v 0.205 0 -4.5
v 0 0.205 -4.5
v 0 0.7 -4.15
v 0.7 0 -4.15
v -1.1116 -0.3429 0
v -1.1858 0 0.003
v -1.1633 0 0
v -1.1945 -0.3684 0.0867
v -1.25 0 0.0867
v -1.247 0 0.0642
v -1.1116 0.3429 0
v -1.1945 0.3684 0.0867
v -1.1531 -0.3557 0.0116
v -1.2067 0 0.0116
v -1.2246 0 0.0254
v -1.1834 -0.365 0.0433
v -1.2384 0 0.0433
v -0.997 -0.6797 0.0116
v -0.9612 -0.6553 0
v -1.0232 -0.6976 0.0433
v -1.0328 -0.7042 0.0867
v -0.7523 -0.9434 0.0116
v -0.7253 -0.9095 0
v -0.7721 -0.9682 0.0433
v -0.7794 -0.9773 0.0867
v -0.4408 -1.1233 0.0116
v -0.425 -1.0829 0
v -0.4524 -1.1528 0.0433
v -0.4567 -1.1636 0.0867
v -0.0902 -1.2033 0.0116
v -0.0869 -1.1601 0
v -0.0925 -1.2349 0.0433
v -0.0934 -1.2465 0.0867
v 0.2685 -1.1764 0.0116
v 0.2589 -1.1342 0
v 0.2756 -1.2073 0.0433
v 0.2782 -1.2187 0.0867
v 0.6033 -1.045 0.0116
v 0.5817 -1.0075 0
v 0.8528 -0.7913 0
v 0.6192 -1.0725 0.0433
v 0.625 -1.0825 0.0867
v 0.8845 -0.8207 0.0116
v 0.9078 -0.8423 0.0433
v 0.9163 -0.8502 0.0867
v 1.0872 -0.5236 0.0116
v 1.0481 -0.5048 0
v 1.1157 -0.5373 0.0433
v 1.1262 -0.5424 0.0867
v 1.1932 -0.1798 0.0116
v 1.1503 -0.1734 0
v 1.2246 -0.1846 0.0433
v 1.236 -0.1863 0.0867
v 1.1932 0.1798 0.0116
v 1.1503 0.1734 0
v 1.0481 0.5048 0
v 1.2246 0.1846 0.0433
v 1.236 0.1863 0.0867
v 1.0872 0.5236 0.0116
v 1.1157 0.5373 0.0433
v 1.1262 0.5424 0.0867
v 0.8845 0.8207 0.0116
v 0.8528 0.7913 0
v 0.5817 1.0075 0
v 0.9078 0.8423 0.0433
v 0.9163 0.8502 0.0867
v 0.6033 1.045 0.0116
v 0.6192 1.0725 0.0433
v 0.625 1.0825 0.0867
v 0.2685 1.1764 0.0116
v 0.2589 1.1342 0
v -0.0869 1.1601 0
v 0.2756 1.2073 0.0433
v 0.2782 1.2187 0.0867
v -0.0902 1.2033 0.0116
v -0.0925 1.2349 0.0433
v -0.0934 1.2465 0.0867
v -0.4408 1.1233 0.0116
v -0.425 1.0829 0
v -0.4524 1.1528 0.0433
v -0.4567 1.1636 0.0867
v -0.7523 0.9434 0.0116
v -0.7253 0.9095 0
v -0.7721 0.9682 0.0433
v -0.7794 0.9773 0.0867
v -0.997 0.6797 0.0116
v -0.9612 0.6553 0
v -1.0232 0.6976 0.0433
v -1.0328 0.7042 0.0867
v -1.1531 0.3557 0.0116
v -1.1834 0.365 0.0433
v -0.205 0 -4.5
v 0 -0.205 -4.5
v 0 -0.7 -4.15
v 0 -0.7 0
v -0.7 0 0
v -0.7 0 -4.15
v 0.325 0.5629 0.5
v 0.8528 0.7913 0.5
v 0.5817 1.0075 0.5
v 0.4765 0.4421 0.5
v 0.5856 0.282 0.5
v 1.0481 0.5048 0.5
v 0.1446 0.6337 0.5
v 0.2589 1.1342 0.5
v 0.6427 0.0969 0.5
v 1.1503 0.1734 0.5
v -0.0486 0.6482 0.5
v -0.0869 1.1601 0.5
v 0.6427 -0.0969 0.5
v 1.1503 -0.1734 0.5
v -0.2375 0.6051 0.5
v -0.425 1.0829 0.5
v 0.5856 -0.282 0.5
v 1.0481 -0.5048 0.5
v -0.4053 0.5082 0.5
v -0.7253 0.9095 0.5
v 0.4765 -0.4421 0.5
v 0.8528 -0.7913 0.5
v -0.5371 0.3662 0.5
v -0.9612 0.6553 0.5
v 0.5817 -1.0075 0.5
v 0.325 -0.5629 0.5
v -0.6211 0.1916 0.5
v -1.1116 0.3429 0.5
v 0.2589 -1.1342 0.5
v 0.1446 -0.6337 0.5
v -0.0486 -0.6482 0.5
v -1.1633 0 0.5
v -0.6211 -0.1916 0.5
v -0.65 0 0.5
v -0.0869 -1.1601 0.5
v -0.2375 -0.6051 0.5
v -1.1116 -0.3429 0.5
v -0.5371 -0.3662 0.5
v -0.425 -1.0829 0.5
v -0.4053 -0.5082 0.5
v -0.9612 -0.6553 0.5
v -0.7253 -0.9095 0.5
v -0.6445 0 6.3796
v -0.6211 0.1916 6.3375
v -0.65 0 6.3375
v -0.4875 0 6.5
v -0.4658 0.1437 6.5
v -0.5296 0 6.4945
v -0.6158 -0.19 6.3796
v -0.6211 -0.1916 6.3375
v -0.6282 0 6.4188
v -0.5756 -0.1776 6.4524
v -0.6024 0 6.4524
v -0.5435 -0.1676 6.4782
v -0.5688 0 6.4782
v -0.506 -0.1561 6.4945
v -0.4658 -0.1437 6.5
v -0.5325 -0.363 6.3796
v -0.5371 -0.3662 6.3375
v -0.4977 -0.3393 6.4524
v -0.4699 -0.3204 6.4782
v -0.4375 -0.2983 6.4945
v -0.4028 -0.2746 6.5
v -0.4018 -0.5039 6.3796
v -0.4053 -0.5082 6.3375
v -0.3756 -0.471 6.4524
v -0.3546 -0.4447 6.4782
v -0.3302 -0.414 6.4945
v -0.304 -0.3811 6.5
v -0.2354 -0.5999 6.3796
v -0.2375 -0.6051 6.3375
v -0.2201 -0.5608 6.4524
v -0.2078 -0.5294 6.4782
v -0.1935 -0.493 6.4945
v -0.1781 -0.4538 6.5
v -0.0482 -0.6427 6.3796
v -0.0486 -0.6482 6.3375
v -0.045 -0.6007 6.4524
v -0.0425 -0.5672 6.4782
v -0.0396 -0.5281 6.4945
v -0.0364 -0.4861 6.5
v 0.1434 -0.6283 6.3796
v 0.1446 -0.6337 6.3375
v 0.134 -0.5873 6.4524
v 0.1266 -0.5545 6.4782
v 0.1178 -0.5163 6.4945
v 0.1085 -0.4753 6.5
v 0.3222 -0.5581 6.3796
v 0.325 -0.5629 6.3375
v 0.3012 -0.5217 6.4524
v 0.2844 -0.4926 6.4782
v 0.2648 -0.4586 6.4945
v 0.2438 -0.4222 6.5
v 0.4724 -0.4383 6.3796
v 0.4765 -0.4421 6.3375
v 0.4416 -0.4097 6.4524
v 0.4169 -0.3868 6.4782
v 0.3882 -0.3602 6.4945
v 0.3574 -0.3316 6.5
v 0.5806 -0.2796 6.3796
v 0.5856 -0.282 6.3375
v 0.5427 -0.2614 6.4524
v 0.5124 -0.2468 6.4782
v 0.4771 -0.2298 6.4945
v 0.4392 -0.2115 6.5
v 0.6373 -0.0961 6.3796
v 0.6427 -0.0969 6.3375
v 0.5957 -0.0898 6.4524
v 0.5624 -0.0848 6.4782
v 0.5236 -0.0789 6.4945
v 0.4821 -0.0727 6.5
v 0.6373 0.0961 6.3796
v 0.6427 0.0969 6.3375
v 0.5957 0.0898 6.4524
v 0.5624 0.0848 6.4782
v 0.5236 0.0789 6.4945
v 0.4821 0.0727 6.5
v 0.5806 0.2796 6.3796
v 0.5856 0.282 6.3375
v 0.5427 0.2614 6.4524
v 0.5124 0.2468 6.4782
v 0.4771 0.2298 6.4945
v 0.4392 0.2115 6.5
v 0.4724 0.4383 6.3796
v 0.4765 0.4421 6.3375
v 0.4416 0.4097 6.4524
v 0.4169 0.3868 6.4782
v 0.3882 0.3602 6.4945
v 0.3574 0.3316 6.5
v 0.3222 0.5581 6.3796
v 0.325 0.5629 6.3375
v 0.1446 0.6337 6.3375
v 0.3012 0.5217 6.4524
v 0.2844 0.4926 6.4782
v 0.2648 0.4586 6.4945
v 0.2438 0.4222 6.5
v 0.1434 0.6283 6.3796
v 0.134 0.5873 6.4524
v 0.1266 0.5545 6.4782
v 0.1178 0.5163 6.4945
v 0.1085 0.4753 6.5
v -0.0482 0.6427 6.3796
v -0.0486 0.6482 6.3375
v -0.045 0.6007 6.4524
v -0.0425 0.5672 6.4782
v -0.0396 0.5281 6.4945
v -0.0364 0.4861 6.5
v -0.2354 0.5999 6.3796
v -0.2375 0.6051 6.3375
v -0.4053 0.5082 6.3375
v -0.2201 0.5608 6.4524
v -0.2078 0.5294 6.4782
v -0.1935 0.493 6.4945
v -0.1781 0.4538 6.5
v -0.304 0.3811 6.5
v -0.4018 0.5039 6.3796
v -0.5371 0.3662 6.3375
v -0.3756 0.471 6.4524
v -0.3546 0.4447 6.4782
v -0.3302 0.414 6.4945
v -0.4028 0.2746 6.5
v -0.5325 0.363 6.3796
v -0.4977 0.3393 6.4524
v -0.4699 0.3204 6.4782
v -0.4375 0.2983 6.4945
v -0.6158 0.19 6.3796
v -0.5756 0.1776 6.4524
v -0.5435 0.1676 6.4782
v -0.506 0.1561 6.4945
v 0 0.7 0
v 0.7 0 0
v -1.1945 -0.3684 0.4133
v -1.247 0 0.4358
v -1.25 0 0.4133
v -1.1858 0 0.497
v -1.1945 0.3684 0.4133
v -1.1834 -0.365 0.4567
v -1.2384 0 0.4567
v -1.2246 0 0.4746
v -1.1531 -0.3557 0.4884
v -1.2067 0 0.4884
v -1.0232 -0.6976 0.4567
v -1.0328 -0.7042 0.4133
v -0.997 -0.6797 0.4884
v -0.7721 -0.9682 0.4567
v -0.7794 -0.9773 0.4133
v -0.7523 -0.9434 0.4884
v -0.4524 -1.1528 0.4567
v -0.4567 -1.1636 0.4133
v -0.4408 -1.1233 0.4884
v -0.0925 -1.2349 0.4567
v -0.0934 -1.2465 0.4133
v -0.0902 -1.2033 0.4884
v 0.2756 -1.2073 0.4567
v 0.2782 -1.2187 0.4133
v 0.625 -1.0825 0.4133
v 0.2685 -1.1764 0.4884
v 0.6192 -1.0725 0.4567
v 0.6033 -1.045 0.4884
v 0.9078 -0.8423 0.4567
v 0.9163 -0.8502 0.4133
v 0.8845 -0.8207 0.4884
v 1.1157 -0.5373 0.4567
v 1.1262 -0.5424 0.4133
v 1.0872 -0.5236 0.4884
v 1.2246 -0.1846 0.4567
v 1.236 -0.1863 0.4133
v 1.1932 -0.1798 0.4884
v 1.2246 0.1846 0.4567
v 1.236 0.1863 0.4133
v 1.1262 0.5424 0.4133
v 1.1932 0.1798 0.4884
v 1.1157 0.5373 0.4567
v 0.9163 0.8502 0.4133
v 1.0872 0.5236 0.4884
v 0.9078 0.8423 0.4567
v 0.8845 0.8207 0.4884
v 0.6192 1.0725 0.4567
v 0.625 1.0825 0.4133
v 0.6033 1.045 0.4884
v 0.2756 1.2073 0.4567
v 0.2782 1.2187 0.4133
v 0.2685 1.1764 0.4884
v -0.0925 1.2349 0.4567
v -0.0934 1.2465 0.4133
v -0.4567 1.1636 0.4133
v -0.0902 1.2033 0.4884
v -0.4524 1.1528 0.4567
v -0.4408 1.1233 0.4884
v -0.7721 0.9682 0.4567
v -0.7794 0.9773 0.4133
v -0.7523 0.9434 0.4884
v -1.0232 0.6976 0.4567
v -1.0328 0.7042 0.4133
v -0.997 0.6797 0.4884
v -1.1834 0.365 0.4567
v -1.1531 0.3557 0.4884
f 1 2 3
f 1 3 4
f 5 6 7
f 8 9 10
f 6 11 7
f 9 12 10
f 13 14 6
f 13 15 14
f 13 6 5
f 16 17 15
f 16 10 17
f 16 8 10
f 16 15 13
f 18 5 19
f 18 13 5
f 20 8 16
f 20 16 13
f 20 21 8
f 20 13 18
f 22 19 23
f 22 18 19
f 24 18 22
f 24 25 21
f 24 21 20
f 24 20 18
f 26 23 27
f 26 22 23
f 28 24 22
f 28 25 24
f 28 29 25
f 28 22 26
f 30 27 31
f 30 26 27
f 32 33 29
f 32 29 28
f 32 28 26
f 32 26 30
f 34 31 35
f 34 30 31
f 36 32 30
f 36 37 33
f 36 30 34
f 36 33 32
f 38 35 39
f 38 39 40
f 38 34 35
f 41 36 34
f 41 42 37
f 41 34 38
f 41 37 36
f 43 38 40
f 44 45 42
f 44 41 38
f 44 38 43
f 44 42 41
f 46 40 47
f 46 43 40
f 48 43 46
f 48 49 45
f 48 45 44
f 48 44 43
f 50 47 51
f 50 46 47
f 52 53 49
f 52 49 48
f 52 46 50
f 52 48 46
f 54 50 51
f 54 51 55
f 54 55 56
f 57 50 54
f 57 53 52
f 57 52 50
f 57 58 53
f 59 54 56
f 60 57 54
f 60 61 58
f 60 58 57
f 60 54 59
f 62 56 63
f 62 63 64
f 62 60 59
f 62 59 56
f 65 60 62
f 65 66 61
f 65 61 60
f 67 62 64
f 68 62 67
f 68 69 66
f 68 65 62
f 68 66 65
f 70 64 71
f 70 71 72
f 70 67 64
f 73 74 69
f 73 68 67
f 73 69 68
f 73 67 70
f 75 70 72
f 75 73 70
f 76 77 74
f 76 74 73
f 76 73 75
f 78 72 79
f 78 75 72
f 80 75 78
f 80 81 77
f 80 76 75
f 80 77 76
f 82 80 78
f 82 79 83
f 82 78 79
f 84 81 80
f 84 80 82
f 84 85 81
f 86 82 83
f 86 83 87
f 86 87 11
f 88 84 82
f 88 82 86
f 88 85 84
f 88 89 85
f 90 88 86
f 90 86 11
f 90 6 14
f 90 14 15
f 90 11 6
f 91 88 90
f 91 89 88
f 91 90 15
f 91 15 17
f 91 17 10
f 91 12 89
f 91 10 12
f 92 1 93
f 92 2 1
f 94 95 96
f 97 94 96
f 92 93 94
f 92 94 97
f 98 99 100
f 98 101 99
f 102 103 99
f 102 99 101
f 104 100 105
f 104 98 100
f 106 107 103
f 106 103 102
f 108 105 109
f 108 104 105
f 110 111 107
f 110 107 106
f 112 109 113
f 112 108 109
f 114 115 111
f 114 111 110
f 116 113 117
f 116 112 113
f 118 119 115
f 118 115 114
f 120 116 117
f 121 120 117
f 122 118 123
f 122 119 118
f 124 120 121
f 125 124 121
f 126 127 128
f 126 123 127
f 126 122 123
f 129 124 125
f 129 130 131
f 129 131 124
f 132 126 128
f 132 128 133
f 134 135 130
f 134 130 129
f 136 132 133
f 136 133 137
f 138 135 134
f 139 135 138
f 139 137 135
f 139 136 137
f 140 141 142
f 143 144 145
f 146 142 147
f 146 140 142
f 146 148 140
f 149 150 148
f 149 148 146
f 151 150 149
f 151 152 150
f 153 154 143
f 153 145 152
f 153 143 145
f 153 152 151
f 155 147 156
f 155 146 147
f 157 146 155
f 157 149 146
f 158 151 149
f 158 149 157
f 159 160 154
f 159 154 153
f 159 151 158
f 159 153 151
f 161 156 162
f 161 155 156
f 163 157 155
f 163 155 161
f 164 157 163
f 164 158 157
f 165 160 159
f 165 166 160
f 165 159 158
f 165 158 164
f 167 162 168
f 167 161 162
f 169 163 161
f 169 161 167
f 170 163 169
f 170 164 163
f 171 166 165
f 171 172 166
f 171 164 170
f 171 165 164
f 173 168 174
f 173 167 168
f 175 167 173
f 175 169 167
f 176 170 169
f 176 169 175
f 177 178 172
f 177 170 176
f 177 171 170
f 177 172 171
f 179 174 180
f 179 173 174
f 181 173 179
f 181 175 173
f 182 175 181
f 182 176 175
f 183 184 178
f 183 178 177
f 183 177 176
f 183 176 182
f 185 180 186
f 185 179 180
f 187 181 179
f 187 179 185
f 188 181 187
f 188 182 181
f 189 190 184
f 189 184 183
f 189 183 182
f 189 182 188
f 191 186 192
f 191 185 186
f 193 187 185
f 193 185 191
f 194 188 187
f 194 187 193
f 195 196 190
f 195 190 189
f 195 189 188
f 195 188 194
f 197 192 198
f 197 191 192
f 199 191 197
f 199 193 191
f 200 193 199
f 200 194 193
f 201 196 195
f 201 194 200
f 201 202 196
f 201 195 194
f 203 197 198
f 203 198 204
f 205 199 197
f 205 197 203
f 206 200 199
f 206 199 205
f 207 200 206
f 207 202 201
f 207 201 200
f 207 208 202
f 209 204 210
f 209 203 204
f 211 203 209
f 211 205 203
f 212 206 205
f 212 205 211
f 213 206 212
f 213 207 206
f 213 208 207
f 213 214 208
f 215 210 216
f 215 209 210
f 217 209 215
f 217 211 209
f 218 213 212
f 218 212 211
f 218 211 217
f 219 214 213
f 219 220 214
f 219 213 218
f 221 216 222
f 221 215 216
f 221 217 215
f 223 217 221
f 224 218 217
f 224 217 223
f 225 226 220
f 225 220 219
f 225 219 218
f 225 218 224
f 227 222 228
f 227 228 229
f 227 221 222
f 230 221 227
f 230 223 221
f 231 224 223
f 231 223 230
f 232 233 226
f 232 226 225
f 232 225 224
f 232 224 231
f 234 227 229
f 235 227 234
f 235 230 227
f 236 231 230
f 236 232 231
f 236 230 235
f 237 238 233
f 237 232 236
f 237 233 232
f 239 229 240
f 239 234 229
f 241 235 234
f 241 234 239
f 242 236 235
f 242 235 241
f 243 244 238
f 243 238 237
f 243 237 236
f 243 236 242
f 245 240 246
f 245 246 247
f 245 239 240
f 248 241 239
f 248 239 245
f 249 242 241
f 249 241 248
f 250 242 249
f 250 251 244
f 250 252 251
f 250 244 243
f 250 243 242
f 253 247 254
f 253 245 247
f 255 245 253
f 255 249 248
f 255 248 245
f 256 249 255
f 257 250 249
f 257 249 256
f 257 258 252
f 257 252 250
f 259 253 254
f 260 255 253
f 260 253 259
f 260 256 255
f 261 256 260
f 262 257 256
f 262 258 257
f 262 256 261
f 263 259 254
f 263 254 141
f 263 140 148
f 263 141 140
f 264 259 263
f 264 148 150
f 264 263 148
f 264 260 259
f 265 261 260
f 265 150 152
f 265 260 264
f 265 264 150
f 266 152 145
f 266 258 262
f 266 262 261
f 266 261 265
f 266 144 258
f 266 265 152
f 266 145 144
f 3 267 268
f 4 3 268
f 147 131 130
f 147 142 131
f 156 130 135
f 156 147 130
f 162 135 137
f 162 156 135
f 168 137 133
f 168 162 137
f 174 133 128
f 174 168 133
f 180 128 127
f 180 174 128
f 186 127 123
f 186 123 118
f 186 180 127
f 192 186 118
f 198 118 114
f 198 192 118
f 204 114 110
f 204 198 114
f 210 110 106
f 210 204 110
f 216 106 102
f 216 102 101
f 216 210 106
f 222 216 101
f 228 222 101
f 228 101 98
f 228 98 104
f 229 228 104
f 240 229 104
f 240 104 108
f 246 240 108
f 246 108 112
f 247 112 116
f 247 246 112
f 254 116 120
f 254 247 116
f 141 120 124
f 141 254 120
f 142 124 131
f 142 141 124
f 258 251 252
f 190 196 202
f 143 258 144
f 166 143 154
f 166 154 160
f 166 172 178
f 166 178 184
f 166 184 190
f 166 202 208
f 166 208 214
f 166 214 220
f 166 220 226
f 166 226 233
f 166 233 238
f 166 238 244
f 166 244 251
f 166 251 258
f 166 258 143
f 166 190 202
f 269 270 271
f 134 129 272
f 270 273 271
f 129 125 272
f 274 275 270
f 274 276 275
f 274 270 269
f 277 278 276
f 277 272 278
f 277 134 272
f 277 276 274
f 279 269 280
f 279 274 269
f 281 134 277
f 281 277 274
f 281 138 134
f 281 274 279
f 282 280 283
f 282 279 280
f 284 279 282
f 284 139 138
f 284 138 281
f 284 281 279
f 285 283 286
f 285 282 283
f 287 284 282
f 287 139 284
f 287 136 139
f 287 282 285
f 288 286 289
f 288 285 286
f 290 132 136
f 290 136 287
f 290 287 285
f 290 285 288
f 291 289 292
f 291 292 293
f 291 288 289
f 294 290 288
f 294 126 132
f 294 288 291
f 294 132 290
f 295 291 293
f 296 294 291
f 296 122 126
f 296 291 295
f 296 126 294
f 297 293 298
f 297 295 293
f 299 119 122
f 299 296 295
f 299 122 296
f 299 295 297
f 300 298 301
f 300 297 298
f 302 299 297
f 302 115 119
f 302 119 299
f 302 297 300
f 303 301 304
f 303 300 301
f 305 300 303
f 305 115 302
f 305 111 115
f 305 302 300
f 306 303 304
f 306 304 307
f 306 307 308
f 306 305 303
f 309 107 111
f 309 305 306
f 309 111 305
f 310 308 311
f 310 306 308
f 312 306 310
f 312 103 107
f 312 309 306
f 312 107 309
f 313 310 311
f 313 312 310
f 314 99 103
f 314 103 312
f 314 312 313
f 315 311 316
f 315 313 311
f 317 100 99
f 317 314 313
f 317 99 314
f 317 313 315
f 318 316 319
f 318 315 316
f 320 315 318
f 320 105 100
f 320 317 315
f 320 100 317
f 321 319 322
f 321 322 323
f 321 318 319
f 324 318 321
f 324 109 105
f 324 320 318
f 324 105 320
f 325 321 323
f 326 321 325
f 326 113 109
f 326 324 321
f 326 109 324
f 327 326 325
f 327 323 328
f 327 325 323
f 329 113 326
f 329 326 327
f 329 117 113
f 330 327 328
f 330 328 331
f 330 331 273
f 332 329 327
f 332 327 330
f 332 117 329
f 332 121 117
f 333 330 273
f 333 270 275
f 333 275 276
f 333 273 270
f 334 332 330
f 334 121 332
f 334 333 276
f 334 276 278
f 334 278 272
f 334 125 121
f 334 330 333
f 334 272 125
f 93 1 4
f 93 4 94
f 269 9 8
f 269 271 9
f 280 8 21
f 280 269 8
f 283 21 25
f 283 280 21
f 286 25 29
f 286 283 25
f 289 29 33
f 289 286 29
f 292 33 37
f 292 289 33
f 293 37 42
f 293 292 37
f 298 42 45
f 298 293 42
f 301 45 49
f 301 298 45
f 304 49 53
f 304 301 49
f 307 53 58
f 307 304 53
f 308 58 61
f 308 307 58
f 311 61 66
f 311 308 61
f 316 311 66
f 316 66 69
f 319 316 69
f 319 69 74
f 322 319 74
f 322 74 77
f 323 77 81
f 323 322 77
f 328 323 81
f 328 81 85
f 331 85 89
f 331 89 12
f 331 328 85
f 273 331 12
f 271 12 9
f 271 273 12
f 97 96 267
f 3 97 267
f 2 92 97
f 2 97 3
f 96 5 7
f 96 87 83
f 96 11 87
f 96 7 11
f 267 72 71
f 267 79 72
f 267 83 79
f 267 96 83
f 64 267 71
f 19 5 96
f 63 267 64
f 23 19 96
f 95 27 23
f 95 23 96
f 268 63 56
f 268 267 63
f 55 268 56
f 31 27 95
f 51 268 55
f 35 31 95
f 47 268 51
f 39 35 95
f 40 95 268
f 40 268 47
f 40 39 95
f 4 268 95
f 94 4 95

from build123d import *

# Parameters (mm, degrees)
PAD_DEPTH    = 4.5
CHAMFER_SIZE = 0.35


with BuildPart() as part:
    # Sketch → Revolution (revolve)
    with BuildSketch(Plane(origin=(0, 0, 0), x_dir=(-1, 0, 0), z_dir=(0, 1, 0))):
        with BuildLine():
            Line((0, 0), (1.163333, 0))
            ThreePointArc((1.163333, 0), (1.224616, 0.025384), (1.25, 0.086667))
            Line((1.25, 0.086667), (1.25, 0.413333))
            ThreePointArc((1.25, 0.413333), (1.224616, 0.474616), (1.163333, 0.5))
            Line((1.163333, 0.5), (0.65, 0.5))
            Line((0.65, 0.5), (0.65, 6.3375))
            ThreePointArc((0.65, 6.3375), (0.602405, 6.452405), (0.4875, 6.5))
            Line((0.4875, 6.5), (0, 6.5))
            Line((0, 6.5), (0, 0))
        make_face()
    revolve(axis=Axis((0, 0, 0), (0, 0, 1)))

    # Sketch001 → Pad (new body)
    with BuildSketch(Plane.XY):
        Polygon((-0.7, 0), (0, 0.7), (0.7, 0), (0, -0.7), align=None)
    extrude(amount=-PAD_DEPTH)

    # Chamfer
    chamfer_edges = [part.edges().sort_by_distance(p)[0] for p in [
        (0.35, -0.35, -4.5),
        (-0.35, -0.35, -4.5),
        (-0.35, 0.35, -4.5),
        (0.35, 0.35, -4.5),
    ]]
    chamfer(chamfer_edges, length=CHAMFER_SIZE)


solid = part.part
